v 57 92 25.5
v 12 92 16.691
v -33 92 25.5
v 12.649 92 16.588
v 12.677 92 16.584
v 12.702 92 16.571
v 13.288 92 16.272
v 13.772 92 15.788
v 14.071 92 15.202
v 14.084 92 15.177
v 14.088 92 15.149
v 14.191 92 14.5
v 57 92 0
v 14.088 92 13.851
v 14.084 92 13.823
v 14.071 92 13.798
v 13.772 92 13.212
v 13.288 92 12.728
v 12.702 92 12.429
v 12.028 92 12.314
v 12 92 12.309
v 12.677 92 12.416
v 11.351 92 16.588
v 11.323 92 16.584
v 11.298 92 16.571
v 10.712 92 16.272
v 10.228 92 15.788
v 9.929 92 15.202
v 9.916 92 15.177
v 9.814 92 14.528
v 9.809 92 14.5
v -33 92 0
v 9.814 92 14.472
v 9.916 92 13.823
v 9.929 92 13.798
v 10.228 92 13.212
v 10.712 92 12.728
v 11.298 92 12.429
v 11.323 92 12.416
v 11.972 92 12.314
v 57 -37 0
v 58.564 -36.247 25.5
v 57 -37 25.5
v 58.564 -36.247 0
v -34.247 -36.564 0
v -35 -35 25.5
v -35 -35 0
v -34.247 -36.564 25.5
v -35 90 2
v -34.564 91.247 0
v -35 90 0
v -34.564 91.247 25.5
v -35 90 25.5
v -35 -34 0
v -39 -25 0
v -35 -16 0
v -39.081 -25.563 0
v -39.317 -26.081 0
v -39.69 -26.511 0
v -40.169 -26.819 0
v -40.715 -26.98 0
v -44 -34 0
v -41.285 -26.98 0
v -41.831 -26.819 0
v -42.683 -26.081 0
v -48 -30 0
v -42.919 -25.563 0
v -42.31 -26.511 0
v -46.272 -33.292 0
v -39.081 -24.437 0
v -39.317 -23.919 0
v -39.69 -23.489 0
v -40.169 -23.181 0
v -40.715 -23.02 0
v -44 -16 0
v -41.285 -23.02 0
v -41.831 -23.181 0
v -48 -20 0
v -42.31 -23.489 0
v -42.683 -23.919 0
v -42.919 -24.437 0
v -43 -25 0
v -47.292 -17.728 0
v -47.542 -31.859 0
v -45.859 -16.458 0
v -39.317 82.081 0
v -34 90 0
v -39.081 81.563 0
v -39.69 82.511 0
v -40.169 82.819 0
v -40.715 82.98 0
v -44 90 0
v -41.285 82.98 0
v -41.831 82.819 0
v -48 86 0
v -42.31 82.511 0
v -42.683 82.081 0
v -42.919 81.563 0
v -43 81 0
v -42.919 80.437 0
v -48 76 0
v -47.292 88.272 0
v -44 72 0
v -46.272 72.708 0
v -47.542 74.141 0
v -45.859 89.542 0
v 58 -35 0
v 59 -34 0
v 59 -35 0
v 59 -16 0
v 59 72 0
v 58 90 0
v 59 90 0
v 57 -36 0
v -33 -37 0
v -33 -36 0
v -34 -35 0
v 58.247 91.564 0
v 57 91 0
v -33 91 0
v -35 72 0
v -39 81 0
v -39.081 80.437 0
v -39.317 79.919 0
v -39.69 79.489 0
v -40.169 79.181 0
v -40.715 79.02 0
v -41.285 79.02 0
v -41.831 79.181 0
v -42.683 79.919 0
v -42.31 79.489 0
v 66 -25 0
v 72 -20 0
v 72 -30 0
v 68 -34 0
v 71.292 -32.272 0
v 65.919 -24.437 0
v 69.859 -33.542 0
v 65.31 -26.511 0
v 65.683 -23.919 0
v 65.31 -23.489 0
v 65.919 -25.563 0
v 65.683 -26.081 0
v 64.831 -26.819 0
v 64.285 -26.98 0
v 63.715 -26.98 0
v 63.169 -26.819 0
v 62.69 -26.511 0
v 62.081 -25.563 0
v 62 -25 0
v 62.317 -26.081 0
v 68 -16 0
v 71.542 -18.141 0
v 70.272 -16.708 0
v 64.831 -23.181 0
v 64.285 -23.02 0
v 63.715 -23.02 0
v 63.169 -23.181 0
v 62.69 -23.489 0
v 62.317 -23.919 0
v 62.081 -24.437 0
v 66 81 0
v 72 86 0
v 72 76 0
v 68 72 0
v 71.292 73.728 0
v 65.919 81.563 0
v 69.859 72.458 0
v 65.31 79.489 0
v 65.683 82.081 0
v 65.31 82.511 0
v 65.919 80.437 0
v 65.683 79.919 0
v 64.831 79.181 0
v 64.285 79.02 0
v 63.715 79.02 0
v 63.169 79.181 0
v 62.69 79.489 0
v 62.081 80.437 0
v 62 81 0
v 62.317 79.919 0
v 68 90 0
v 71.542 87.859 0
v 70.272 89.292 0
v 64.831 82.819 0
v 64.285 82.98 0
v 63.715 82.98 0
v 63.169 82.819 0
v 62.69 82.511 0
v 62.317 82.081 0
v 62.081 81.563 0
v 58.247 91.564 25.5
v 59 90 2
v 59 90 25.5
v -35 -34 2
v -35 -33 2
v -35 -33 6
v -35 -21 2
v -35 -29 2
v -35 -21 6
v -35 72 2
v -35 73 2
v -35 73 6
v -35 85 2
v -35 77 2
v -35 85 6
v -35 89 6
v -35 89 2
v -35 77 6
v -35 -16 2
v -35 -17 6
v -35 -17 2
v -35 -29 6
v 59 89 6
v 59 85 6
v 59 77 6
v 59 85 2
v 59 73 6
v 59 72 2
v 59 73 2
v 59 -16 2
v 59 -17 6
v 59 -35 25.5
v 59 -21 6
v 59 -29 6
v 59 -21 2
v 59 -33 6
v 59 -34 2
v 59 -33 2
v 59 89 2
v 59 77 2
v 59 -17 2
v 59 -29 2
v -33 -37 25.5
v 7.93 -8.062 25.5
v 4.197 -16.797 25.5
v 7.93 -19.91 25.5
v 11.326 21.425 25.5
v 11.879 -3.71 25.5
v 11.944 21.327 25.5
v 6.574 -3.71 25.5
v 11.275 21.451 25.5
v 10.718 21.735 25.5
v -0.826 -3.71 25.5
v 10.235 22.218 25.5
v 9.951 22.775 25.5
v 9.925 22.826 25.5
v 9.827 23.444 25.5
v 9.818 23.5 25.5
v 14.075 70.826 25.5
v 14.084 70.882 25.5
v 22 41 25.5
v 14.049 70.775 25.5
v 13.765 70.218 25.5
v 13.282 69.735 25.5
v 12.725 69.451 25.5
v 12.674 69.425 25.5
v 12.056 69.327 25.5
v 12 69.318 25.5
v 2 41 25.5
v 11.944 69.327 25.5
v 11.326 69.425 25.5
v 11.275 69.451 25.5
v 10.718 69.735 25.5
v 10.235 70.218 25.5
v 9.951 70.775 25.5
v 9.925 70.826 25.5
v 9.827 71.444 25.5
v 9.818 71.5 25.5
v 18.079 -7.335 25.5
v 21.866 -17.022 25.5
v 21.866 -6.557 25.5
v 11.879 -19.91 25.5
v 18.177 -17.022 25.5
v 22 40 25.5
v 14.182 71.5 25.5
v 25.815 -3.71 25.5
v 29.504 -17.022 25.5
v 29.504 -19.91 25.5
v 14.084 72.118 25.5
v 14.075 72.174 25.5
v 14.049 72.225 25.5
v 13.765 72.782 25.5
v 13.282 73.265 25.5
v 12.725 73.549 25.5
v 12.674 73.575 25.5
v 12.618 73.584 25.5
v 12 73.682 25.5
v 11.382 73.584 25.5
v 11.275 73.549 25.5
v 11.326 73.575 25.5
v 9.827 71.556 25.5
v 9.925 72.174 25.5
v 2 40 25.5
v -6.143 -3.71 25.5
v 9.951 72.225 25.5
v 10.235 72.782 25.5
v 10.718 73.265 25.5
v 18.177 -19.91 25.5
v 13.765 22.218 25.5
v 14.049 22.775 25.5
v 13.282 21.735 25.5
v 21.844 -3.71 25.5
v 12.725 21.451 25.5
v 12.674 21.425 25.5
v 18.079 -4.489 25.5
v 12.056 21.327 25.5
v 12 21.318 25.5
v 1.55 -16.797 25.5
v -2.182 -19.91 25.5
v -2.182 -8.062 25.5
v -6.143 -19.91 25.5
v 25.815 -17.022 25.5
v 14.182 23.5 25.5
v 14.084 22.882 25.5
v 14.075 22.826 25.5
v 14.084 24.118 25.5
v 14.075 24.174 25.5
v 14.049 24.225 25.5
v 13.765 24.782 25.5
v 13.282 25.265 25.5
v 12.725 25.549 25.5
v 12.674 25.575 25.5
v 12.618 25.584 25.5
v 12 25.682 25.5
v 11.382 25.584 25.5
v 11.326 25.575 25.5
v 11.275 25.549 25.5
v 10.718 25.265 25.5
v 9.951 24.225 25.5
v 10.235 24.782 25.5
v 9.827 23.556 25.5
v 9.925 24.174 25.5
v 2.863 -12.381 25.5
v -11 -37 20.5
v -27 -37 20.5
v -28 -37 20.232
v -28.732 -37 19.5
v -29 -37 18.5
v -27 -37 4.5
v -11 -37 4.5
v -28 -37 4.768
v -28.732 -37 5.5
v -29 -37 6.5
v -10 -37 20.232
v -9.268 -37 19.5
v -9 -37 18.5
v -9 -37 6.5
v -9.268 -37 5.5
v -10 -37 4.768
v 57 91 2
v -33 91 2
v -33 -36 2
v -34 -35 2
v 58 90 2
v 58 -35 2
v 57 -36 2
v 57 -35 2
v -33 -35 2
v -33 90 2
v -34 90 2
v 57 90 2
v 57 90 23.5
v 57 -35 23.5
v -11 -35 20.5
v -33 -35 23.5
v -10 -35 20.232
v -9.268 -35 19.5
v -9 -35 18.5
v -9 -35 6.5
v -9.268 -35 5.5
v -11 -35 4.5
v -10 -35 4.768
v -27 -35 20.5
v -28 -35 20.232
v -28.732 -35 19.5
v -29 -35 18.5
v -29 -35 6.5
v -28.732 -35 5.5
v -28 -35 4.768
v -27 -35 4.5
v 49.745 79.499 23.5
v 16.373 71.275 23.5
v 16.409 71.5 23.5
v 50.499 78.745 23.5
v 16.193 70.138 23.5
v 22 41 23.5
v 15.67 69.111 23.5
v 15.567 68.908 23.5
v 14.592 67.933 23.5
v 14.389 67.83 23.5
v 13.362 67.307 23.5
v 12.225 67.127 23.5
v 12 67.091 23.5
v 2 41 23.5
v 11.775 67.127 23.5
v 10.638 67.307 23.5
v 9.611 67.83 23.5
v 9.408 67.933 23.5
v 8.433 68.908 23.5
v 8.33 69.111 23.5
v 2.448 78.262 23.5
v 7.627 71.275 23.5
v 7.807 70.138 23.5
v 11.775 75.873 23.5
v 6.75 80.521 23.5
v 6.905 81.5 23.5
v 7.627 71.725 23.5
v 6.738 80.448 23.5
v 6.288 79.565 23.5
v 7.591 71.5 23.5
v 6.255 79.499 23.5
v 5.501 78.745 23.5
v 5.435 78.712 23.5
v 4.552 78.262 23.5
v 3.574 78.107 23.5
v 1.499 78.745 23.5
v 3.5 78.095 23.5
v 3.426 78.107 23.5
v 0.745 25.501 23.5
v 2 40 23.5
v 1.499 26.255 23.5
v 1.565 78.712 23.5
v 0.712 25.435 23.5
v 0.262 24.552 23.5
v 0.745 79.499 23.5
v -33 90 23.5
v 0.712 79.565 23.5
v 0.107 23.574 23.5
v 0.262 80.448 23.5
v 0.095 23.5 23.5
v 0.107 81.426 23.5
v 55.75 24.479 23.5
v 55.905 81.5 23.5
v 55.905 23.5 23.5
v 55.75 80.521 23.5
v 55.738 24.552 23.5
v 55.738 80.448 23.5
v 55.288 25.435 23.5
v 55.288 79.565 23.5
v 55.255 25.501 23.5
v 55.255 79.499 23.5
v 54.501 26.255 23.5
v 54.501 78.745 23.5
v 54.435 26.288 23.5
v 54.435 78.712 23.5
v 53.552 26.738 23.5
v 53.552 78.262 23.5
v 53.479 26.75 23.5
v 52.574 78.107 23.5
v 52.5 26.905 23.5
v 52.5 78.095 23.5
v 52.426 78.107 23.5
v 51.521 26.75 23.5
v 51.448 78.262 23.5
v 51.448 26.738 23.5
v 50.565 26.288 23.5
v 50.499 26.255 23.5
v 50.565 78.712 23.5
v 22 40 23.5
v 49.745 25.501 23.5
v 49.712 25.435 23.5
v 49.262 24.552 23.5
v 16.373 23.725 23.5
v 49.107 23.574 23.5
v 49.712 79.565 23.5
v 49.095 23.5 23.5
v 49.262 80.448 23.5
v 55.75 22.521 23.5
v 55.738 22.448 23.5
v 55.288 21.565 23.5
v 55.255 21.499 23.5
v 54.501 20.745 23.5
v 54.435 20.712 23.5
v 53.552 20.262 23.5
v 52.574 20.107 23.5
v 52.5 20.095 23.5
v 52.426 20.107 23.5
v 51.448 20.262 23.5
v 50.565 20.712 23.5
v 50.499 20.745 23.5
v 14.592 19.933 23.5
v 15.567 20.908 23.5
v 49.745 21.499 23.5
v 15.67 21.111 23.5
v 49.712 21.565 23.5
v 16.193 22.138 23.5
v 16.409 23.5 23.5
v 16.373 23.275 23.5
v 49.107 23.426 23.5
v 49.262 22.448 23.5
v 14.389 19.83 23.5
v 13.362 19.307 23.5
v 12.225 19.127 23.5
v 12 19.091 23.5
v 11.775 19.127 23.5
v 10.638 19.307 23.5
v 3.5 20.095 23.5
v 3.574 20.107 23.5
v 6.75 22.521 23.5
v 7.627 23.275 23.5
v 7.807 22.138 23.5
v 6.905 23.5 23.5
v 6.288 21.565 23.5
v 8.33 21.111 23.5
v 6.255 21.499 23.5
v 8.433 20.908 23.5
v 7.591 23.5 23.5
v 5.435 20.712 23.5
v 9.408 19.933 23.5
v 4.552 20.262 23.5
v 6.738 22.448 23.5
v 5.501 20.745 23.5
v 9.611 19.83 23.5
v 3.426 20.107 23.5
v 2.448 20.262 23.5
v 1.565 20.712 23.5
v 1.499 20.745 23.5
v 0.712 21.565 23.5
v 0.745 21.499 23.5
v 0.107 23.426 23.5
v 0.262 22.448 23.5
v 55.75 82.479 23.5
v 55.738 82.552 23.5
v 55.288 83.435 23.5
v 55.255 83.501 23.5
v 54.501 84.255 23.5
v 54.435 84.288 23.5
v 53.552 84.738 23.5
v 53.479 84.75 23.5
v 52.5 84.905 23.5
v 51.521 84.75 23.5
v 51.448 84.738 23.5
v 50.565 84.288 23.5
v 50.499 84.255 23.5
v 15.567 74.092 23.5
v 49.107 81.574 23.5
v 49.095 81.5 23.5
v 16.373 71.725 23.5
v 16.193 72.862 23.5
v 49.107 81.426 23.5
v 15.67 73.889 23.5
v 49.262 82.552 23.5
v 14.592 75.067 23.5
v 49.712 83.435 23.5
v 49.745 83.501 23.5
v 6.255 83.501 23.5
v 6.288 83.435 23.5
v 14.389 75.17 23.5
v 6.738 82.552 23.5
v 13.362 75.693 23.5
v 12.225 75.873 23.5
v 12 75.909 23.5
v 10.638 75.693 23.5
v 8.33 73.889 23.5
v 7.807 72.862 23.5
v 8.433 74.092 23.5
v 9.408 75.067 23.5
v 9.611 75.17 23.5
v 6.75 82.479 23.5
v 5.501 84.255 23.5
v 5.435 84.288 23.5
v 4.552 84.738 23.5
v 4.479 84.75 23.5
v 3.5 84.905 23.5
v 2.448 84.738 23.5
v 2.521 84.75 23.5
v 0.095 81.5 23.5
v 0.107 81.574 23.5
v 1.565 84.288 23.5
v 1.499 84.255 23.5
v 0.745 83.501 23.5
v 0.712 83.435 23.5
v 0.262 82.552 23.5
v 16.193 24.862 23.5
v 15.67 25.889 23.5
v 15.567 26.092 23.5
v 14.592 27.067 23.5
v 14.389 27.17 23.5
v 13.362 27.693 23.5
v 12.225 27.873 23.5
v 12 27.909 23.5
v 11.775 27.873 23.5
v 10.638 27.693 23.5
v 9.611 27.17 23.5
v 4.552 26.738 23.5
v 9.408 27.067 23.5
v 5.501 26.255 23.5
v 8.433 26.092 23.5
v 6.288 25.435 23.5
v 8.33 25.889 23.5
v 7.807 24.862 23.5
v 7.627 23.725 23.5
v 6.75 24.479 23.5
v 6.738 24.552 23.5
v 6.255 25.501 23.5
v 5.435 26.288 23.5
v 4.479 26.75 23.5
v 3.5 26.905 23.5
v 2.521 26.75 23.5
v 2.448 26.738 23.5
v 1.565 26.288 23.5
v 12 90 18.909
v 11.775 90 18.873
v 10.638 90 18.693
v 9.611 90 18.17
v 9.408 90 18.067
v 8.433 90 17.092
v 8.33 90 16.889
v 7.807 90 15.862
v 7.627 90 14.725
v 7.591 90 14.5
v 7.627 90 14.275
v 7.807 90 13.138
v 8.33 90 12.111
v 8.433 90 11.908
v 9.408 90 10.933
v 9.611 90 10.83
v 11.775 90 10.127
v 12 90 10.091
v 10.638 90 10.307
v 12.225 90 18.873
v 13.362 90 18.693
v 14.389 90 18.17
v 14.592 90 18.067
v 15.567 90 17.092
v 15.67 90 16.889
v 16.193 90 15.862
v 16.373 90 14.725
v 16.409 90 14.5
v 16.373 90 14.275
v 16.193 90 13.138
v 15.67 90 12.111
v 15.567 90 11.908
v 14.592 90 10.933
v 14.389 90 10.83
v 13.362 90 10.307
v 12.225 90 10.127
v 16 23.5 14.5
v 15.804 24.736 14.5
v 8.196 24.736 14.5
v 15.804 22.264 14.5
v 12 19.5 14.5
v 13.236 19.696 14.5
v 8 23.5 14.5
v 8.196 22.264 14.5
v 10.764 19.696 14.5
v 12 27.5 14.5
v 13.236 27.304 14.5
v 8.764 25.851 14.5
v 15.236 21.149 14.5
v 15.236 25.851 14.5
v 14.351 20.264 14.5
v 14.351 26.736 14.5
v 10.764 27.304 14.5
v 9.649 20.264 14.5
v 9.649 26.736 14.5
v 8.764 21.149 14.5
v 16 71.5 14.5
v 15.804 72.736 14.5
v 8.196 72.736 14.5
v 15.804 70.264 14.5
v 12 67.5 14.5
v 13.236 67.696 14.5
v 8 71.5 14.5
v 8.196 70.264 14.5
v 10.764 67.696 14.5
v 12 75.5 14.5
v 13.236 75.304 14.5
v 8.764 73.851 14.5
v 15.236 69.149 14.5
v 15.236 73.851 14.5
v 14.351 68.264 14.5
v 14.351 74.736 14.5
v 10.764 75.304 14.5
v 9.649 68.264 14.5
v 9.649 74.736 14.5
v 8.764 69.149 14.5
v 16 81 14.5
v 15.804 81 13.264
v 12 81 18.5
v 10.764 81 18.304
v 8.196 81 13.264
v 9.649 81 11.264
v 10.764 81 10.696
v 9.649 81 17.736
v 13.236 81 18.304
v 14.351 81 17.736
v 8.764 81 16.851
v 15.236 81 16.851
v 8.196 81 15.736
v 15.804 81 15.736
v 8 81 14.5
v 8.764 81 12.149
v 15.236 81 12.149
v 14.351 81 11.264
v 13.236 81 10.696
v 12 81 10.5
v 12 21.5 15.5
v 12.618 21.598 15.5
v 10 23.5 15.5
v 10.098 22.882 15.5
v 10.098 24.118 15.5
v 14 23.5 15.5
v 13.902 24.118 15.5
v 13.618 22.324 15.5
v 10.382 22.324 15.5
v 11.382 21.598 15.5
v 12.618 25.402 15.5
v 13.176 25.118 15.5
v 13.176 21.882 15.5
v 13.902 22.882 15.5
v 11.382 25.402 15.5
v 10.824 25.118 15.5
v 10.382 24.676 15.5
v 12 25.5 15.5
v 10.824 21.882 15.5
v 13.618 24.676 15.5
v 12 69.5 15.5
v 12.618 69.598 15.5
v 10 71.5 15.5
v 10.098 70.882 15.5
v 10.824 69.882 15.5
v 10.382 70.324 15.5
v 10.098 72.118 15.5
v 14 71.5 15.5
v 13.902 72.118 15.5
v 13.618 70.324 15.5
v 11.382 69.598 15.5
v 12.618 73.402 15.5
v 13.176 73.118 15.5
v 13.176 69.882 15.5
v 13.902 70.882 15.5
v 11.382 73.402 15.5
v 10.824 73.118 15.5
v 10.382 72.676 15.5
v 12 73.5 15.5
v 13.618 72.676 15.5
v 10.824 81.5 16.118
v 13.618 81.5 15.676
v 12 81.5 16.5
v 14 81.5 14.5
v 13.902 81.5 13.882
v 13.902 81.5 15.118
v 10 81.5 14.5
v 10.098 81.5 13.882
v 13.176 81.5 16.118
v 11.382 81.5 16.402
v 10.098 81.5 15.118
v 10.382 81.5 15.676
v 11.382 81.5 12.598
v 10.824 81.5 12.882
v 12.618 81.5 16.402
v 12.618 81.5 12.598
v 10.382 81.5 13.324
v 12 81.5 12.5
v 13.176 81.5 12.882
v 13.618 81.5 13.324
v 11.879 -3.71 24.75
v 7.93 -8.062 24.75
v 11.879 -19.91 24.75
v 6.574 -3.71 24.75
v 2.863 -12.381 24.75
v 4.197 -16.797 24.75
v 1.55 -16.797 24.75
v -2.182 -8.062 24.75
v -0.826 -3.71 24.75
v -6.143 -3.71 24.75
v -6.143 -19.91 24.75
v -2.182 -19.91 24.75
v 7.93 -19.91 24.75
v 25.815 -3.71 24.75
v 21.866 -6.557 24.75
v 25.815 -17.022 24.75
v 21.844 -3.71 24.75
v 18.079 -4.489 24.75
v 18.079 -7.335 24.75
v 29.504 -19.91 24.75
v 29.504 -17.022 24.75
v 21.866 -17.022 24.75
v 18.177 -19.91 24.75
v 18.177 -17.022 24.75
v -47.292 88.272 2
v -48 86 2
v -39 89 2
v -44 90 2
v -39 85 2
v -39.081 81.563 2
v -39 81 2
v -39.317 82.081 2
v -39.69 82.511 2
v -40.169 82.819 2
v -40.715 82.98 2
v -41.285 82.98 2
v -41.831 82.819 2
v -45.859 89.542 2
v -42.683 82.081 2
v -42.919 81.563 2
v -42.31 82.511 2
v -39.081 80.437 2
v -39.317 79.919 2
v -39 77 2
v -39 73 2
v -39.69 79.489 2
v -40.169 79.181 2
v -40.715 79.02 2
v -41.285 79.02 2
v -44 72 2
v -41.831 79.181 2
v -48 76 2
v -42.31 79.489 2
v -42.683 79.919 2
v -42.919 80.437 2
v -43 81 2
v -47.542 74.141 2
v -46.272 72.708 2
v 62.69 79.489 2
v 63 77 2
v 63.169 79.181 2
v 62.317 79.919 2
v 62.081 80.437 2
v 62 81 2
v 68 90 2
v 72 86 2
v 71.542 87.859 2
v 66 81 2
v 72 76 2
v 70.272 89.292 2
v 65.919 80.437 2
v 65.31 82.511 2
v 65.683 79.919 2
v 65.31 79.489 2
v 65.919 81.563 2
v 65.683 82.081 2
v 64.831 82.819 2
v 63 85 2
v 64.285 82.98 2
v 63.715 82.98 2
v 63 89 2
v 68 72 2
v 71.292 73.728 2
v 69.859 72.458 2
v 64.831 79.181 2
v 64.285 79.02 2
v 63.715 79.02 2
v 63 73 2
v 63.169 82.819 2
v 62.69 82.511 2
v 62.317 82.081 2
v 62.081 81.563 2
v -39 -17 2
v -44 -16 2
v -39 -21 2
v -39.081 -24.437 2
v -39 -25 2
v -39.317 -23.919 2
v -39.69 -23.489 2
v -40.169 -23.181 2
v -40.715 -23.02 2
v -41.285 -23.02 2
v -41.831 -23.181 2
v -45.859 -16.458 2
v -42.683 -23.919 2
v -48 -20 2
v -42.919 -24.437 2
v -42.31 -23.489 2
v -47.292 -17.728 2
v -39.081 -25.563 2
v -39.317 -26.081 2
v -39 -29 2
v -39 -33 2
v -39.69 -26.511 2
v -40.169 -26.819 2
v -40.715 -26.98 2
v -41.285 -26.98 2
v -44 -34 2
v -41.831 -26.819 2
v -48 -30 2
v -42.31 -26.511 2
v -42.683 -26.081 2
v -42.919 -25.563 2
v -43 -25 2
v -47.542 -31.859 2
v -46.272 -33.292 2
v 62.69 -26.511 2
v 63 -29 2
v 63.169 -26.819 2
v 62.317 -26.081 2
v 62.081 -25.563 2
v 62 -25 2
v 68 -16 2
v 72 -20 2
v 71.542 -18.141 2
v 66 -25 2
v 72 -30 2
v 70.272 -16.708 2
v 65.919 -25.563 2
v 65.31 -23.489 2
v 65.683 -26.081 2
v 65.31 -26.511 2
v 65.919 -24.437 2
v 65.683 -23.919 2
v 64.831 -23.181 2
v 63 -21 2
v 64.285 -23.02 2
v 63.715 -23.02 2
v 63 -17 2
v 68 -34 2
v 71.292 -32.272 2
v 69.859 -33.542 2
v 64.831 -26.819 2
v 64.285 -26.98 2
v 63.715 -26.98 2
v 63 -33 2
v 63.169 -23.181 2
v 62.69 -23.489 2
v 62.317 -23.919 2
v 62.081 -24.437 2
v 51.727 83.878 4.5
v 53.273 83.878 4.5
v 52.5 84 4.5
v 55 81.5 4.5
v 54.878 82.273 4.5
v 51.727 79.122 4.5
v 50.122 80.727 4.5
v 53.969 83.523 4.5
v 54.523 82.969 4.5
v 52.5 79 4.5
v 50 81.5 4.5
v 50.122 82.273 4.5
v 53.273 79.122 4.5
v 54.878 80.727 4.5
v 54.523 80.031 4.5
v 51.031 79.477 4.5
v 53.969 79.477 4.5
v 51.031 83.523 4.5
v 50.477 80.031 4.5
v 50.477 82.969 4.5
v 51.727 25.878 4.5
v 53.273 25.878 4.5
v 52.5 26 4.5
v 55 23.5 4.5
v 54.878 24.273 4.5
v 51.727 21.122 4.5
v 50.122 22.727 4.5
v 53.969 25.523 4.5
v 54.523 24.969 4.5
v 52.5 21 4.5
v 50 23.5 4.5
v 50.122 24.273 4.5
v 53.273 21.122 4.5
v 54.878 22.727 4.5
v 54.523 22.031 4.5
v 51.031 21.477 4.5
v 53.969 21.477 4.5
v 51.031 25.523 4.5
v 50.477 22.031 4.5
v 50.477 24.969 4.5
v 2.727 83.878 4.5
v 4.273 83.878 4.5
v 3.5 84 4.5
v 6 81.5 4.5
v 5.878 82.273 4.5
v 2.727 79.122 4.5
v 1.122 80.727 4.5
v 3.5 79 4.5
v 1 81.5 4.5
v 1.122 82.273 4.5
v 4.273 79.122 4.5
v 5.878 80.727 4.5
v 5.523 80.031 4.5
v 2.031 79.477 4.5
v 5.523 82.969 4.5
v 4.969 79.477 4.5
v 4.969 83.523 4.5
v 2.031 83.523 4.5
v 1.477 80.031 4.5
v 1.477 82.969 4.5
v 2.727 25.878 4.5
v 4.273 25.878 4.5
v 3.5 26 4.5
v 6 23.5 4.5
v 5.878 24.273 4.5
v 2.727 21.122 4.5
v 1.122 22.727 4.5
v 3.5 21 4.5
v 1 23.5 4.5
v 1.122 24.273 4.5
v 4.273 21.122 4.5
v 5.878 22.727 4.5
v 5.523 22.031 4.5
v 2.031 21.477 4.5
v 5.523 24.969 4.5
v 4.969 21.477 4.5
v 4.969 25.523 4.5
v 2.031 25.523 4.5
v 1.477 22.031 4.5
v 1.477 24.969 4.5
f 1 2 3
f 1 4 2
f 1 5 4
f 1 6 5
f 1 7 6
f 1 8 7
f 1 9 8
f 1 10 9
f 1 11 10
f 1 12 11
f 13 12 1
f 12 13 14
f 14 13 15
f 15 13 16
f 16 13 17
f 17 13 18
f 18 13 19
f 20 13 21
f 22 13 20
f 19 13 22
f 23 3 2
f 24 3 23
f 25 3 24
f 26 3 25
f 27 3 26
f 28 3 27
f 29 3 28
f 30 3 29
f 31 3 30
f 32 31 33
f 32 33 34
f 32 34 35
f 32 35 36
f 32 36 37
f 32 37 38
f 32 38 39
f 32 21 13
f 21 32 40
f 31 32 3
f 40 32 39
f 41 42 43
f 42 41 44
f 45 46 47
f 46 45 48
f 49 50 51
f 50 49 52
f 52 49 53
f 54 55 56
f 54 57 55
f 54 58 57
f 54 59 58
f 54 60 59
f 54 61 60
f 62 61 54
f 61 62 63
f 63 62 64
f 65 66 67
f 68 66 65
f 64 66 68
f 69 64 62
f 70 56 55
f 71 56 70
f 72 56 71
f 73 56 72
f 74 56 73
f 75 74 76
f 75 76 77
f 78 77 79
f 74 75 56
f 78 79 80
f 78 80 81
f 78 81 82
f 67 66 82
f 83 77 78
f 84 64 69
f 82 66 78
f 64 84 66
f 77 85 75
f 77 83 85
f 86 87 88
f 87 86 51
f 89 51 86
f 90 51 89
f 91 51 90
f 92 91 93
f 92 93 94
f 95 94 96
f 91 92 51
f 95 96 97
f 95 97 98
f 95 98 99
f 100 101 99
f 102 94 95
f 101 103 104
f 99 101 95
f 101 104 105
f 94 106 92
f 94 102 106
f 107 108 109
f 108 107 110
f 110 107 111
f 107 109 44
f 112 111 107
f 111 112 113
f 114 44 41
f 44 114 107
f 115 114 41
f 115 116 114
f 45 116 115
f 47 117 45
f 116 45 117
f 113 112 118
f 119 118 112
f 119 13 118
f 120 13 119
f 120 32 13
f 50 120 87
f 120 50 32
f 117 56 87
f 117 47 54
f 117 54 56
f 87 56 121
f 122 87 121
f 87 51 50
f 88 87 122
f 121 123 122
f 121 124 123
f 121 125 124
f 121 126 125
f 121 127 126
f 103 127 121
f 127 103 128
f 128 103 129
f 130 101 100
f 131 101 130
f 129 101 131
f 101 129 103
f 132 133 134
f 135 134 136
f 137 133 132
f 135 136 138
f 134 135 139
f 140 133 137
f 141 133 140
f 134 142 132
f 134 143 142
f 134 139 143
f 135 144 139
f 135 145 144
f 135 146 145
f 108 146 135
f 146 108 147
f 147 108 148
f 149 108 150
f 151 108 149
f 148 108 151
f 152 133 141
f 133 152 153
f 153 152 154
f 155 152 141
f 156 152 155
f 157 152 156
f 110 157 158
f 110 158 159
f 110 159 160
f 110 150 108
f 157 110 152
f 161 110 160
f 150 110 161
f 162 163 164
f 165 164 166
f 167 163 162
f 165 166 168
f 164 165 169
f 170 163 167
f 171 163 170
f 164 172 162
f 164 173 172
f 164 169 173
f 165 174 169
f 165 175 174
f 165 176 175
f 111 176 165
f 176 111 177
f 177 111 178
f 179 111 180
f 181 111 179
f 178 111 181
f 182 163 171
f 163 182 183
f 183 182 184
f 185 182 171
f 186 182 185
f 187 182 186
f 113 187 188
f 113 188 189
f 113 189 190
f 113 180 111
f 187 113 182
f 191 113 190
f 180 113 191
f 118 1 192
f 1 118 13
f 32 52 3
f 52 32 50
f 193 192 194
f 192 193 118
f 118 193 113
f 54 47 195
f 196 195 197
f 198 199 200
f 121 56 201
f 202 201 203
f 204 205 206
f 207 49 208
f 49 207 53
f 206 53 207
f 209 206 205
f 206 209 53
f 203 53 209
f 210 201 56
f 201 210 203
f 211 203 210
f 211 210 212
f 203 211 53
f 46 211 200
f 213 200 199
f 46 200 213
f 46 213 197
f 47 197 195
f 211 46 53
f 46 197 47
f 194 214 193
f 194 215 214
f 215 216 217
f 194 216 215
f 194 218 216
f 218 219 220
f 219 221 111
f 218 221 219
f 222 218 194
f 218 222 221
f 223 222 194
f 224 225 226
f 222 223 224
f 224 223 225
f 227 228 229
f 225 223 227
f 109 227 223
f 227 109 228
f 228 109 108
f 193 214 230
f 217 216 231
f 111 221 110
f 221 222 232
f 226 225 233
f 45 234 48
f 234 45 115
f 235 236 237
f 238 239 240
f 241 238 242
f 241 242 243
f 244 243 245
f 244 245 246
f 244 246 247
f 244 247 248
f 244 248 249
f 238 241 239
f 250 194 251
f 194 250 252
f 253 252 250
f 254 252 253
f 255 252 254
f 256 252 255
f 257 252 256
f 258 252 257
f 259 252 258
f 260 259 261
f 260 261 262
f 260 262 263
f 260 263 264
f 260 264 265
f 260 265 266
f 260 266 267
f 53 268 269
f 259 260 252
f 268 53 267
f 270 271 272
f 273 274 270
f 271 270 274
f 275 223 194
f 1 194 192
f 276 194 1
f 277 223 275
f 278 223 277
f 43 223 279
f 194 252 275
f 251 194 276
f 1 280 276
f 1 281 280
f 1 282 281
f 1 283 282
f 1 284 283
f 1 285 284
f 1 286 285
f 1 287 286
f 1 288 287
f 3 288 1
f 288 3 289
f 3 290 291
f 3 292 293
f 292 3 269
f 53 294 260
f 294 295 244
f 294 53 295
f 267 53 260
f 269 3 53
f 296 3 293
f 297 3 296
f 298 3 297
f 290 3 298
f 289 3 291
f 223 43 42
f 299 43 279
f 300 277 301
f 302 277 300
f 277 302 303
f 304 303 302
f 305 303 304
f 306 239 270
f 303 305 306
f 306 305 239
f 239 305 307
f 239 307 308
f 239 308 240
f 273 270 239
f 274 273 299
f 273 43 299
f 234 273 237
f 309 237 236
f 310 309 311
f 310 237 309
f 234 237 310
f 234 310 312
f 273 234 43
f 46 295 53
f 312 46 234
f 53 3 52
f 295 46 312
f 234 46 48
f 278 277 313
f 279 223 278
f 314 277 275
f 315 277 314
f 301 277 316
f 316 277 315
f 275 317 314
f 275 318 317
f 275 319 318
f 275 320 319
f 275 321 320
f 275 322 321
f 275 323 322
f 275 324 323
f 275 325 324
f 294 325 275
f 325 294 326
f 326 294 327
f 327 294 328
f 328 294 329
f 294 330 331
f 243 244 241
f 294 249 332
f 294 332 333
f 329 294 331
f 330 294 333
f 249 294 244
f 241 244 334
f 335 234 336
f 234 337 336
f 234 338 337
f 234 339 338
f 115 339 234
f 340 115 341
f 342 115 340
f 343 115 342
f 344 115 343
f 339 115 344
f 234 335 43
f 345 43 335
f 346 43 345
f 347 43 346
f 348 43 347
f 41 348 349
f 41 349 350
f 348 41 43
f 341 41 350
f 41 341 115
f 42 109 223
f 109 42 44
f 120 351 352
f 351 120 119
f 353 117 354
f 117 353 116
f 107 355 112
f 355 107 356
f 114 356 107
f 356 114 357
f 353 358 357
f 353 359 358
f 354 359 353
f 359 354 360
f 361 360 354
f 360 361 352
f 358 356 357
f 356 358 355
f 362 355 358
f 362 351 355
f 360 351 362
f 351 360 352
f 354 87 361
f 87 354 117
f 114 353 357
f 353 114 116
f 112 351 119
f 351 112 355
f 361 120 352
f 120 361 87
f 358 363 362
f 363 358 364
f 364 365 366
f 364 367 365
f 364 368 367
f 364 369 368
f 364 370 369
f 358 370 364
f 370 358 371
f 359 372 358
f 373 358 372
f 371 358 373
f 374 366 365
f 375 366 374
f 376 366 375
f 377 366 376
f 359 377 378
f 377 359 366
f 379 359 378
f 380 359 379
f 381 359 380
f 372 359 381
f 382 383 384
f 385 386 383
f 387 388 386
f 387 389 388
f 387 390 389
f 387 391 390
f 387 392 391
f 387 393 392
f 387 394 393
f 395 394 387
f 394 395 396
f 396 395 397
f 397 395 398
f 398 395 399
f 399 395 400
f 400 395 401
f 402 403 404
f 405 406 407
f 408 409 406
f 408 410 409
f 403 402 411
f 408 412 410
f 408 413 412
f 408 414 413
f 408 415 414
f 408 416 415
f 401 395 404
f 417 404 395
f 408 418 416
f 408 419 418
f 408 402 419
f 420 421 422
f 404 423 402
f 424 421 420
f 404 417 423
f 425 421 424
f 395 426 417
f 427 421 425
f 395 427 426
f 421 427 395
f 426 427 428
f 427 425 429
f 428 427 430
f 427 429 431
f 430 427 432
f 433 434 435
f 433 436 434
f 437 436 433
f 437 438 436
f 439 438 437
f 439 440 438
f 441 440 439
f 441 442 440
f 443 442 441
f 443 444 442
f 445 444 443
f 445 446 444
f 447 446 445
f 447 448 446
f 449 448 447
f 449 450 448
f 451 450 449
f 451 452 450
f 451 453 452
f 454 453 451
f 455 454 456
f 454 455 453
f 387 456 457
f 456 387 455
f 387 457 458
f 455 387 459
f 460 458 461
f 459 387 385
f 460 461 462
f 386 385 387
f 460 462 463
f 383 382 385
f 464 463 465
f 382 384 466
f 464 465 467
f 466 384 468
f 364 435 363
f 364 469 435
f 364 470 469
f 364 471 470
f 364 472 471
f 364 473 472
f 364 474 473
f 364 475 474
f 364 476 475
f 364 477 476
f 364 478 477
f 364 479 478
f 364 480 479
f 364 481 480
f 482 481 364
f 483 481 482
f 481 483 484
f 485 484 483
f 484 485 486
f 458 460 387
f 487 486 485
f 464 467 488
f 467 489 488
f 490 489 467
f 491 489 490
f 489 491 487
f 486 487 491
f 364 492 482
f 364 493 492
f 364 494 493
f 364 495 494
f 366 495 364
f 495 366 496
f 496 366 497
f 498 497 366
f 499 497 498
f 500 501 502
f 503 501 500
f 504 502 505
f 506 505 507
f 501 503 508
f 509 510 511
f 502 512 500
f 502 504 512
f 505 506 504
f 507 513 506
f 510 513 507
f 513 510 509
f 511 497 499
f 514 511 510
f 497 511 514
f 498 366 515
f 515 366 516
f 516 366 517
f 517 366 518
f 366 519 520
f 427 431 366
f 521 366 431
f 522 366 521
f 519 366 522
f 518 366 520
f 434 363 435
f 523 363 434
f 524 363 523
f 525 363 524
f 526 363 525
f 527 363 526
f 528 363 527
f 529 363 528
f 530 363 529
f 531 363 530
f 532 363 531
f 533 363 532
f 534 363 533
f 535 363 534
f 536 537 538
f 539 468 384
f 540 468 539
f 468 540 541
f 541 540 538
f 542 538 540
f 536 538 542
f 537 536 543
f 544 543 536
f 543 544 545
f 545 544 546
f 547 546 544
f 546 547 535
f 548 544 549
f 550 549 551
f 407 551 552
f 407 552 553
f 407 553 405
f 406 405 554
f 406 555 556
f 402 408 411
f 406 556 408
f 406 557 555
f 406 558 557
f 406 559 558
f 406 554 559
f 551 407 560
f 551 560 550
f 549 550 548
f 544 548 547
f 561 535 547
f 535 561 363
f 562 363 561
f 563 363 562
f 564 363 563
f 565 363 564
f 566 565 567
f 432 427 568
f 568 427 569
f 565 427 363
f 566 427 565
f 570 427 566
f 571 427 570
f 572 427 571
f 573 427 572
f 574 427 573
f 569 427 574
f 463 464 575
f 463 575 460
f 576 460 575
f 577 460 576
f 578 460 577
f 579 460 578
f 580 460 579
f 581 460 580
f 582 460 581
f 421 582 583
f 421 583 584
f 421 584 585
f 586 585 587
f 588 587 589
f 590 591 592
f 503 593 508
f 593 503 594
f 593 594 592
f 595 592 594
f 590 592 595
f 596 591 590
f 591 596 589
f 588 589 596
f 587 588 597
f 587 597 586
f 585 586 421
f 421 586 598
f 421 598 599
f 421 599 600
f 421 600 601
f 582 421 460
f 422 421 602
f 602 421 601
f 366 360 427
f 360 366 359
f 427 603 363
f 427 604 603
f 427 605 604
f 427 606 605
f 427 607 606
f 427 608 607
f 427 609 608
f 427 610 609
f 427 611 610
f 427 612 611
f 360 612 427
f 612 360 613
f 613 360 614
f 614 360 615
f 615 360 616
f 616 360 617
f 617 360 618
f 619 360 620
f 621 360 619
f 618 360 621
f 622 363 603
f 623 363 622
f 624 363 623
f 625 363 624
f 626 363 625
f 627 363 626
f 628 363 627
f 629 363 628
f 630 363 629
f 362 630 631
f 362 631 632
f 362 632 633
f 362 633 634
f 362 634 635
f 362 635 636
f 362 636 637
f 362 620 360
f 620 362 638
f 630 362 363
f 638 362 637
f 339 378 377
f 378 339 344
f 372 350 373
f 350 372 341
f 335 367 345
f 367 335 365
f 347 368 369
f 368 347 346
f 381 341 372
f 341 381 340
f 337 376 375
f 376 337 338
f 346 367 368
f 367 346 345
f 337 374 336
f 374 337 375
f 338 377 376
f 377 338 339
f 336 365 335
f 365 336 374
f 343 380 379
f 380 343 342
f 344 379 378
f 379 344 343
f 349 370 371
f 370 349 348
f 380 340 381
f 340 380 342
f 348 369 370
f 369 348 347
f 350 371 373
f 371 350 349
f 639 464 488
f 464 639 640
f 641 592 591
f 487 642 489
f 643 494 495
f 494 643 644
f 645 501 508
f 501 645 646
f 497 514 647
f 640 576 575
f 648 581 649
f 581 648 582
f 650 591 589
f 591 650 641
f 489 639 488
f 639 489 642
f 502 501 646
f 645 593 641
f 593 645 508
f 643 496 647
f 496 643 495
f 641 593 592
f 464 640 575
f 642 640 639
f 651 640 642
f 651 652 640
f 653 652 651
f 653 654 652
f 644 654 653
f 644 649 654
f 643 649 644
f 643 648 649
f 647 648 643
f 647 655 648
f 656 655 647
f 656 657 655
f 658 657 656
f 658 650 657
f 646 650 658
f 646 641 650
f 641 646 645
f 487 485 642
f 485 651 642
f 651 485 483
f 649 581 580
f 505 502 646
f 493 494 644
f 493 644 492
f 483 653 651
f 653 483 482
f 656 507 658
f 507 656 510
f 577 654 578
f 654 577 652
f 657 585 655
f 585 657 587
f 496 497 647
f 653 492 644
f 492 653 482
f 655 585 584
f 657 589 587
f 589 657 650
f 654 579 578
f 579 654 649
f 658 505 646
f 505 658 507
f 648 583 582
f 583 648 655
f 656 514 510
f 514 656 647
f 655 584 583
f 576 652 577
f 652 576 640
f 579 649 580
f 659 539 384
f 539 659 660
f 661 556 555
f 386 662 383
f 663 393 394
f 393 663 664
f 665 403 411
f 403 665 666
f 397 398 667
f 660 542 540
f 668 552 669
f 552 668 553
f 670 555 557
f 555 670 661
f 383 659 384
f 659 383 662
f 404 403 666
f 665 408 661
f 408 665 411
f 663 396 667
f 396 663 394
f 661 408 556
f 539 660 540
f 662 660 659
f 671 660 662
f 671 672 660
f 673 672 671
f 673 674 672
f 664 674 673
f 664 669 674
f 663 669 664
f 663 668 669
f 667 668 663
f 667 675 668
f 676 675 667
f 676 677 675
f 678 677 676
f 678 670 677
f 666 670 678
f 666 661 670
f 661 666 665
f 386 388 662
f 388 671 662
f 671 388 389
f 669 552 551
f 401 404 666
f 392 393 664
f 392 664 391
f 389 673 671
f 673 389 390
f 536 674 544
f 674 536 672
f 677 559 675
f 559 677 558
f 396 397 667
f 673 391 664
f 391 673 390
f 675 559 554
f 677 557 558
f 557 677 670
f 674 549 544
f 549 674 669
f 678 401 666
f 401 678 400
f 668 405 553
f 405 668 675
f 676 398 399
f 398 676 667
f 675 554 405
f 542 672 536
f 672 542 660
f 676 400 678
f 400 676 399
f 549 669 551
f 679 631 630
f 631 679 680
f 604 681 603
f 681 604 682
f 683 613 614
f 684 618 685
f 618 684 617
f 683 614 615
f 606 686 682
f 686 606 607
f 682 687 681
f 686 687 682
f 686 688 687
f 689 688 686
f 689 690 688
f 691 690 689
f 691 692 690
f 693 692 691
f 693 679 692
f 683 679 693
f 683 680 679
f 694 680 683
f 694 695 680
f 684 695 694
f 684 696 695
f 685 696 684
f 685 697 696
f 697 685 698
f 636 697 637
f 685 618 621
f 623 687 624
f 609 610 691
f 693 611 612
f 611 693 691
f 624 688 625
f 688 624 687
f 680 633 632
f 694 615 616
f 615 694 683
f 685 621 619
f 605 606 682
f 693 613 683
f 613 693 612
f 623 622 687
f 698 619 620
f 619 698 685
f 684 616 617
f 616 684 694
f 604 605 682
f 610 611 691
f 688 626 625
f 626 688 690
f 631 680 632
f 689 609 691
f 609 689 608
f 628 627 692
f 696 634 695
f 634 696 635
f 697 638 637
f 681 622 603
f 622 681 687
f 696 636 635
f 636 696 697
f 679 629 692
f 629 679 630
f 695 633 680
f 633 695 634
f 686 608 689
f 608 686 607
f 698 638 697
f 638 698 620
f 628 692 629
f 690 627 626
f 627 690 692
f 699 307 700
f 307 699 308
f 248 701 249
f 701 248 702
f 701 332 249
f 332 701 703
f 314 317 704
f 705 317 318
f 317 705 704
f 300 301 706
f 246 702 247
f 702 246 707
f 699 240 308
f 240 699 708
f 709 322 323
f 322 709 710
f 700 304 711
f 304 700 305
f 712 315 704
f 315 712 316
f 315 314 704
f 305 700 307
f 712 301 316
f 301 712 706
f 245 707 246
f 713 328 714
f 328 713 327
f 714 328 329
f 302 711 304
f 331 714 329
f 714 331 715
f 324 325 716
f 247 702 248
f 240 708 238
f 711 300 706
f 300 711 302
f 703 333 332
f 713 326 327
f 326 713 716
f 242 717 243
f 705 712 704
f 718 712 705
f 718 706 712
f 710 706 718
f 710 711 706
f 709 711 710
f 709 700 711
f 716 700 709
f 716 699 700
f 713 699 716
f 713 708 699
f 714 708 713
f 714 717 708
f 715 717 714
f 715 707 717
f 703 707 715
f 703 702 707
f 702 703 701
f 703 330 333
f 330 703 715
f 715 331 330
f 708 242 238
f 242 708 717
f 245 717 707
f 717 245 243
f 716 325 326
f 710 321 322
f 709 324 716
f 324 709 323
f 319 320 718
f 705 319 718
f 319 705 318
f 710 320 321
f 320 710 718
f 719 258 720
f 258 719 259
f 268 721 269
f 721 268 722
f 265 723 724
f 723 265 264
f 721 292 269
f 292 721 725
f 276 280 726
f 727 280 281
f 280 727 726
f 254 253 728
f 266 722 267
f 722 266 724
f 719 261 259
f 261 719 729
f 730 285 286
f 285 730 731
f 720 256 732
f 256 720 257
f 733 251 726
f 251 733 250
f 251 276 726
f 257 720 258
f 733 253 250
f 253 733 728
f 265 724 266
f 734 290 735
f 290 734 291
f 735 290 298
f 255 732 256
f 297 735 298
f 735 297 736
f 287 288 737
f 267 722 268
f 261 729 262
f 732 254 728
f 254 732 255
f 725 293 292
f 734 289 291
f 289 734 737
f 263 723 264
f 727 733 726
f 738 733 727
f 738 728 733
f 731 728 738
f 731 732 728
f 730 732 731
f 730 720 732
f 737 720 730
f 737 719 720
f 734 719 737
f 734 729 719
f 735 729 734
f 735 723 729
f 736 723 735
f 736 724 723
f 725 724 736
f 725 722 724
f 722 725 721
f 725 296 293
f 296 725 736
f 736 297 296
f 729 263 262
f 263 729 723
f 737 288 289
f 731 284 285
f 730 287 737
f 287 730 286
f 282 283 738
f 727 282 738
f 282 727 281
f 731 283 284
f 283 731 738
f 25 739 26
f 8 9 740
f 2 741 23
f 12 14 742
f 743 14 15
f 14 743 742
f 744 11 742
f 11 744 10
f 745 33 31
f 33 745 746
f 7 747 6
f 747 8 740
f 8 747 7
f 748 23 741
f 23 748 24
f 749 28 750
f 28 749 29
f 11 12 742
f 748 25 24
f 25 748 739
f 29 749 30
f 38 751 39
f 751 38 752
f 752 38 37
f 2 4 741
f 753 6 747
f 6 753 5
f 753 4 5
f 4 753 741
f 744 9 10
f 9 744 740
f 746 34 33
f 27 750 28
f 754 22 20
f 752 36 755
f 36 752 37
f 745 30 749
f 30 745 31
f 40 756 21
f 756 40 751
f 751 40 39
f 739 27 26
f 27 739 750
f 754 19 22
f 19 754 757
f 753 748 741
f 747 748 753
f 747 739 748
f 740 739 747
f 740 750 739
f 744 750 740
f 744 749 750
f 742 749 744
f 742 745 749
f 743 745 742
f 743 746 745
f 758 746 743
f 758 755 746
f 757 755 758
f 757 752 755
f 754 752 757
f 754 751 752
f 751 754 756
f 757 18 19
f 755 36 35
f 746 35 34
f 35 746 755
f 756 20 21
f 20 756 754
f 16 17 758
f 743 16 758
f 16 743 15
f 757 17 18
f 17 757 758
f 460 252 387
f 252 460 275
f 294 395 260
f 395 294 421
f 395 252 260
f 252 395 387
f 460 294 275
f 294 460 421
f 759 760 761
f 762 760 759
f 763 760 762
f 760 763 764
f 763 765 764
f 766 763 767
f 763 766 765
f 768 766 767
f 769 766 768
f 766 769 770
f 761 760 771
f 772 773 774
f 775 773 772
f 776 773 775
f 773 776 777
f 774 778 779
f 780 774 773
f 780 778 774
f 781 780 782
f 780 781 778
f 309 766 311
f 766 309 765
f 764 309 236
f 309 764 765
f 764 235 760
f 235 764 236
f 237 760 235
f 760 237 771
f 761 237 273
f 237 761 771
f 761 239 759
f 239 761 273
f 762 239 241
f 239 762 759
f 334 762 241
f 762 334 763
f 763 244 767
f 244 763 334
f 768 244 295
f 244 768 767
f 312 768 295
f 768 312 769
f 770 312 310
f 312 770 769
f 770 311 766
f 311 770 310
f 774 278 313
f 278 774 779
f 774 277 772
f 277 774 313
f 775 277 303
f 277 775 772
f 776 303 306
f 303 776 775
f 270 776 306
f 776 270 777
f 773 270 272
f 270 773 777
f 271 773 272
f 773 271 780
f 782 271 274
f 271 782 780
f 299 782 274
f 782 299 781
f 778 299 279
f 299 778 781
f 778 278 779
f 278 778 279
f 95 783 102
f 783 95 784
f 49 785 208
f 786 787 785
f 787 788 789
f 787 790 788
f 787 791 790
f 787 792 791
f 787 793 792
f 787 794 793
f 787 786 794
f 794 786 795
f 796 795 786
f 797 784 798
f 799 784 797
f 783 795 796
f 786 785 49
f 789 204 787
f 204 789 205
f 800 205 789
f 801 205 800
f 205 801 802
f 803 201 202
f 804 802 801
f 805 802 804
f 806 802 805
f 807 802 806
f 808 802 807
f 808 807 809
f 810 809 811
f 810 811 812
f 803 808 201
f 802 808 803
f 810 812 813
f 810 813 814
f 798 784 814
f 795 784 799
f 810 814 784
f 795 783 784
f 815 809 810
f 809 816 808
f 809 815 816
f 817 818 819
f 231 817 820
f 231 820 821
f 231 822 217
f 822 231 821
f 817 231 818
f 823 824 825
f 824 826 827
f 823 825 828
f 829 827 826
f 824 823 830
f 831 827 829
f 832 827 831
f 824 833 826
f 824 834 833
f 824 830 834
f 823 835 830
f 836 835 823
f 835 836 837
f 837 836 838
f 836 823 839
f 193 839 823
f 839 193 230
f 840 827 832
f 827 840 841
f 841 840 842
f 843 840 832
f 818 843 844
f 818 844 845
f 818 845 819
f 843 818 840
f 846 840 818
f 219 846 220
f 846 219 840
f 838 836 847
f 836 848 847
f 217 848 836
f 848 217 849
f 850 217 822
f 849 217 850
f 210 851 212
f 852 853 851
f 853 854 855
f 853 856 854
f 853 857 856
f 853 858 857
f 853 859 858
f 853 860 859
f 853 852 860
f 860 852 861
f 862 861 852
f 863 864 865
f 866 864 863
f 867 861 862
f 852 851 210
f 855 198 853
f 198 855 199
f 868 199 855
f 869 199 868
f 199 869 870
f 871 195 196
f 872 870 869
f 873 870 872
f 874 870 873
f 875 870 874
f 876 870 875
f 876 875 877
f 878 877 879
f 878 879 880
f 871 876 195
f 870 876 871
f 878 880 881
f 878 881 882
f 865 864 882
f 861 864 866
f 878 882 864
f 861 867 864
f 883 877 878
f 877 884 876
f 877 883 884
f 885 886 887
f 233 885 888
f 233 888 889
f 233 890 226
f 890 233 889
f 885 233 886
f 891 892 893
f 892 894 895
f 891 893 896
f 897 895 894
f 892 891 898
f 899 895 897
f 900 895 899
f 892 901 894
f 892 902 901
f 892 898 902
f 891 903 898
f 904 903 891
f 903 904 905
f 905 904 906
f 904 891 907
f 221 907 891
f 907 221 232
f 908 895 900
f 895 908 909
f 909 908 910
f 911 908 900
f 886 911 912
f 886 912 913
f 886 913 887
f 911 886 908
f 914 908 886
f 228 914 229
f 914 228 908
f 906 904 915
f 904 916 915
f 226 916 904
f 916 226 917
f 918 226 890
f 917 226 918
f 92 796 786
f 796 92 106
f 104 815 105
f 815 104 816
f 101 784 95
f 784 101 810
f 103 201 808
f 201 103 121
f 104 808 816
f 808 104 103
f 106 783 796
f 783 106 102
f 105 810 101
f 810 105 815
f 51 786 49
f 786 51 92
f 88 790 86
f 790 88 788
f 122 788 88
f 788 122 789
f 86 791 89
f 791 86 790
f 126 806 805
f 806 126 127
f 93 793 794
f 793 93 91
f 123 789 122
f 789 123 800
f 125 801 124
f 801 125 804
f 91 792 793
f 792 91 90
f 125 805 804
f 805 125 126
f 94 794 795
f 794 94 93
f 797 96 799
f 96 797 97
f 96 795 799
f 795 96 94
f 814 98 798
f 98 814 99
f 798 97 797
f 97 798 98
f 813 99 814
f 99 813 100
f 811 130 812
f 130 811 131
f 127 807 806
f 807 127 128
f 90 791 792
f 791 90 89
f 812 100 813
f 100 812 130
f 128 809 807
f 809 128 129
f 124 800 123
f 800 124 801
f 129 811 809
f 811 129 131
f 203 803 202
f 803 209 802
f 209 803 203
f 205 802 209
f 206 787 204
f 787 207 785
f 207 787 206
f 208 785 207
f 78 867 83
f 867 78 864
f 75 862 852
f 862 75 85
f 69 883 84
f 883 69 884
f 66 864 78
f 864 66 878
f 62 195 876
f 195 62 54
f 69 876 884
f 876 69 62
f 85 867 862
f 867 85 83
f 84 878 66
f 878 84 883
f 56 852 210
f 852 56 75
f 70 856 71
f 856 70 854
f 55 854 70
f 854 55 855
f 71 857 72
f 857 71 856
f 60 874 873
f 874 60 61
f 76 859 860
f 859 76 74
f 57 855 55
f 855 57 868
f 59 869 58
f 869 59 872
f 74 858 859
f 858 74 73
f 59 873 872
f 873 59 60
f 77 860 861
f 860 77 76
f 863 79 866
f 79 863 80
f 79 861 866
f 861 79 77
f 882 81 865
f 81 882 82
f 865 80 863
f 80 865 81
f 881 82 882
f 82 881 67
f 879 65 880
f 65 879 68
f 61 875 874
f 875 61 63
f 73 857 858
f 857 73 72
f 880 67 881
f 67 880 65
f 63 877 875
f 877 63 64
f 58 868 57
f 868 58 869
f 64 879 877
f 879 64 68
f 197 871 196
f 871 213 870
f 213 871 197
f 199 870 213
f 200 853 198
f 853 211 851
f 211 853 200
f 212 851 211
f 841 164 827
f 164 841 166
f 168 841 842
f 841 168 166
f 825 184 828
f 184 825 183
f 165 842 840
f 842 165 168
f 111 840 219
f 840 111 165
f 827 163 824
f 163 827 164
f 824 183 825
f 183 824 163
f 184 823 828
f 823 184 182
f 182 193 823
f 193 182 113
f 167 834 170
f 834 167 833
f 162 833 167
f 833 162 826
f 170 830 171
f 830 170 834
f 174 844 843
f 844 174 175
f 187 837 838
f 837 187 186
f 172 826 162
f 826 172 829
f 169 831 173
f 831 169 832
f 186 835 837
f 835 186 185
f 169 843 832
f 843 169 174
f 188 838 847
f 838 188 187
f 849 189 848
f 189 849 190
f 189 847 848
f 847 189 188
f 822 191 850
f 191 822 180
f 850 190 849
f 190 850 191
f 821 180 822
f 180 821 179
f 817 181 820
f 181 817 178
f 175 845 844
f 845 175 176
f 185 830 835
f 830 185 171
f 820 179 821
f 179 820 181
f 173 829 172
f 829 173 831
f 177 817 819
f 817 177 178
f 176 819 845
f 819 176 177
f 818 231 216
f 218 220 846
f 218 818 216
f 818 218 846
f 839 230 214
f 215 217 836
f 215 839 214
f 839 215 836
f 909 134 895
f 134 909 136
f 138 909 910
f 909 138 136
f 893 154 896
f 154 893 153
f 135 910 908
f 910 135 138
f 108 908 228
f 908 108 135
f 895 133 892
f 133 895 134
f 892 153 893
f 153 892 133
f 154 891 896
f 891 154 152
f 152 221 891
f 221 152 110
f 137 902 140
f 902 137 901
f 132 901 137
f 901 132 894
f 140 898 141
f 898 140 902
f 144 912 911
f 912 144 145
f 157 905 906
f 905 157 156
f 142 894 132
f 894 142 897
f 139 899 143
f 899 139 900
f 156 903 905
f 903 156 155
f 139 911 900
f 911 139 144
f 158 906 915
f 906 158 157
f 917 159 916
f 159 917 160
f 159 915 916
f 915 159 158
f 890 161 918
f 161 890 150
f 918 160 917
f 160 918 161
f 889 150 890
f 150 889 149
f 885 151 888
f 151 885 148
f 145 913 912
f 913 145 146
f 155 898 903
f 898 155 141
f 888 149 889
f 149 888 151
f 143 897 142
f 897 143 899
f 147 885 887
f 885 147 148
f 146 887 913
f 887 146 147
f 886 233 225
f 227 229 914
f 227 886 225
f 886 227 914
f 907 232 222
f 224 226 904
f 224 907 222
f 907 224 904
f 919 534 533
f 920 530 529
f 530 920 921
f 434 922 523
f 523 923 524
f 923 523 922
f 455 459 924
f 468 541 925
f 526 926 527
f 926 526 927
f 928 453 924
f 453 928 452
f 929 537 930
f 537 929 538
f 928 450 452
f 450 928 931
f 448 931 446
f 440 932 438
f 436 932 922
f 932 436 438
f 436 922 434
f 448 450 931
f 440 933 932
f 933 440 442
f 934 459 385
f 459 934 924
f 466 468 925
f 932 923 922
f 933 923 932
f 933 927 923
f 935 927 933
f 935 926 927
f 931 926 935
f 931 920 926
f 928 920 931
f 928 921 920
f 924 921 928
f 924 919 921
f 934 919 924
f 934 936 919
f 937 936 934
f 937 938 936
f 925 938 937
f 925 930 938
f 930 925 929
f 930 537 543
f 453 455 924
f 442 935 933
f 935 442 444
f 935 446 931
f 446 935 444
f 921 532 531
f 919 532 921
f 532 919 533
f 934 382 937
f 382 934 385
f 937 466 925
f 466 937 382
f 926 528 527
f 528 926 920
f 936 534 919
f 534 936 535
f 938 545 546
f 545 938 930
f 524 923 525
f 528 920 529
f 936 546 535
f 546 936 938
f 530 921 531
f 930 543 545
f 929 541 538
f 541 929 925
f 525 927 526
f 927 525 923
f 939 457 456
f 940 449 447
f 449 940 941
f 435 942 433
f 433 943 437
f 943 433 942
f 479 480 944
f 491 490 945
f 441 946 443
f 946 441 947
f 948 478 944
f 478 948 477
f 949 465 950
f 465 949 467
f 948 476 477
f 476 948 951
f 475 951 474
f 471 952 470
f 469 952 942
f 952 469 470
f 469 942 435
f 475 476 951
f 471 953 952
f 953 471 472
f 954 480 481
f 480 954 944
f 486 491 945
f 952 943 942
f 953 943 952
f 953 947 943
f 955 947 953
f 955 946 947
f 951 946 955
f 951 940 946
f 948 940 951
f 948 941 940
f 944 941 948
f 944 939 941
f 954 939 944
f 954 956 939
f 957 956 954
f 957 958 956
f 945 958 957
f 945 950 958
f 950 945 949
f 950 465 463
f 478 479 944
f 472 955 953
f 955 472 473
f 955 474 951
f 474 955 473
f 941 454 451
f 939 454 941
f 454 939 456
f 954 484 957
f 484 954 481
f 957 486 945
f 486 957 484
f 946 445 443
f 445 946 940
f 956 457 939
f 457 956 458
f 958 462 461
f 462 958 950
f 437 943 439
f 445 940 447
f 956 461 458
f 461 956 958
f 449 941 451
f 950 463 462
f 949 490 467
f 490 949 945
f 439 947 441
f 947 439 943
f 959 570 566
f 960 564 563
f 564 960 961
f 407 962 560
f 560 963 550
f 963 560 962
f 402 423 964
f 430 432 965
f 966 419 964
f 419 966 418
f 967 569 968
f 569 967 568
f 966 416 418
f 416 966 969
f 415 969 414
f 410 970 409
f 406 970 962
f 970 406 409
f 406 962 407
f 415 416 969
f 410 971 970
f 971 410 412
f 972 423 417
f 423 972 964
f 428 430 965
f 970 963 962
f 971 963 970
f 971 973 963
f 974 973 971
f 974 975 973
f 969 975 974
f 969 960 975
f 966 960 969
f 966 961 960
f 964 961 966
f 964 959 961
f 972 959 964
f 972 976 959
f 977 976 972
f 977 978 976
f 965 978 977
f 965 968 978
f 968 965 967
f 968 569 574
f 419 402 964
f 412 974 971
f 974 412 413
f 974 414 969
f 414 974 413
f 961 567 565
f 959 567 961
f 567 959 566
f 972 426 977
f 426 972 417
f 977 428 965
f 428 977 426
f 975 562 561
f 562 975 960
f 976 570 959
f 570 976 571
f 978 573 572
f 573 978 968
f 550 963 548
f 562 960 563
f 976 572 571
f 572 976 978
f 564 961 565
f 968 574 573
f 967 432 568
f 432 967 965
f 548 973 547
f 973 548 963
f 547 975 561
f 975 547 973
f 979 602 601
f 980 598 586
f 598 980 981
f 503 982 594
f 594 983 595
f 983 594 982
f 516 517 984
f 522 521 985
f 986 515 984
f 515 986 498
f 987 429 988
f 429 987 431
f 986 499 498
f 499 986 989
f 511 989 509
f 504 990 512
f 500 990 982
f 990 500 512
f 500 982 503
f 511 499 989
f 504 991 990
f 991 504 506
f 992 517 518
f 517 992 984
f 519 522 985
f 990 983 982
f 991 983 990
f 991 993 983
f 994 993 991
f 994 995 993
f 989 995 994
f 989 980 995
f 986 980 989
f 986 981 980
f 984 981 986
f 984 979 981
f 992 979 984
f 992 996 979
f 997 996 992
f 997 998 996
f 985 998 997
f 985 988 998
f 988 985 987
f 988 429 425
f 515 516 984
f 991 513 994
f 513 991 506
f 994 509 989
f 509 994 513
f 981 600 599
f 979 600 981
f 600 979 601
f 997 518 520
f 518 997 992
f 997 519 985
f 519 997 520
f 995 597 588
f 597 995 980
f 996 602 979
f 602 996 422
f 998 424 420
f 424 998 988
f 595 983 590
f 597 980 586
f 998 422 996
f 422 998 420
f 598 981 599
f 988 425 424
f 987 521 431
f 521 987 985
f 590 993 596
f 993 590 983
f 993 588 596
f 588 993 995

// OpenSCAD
// Mbox1b.scad
// This is the lid
difference(){
union(){
// main tub
translate([-33,-35,0]){
difference(){    

    linear_extrude(height=25.5)
    offset(r=2)
    square([90,125]);
        
    translate([0,0,-0.1])    
    linear_extrude(height=2.1)
    offset(r=1)
    square([90,125]);    

    translate([0,0,0])    
    linear_extrude(height=23.5)
    offset(r=0)
    square([90,125]);    
    
    // cutout for PoE cable in
    color("orange")
    translate([6,0.5,6.5]) 
    rotate([90,0,0])
    linear_extrude(height=4)
    offset(r=2,$fn=12)
    square([16,12]);
   
 }
}   // end of translate for base    


// socket bosses for the camera pole
translate([12,23.5,14.5]){
    cylinder(r1=4,r2=4.5,h=11,$fn=20);
}    
translate([12,71.5,14.5]){
    cylinder(r1=4,r2=4.5,h=11,$fn=20);
}    
translate([12,81,14.5]){
    rotate([-90,0,0])
    cylinder(r1=4,r2=4.5,h=11,$fn=20);
}    

}  // end of union


// cut socket holes for the camera pole
translate([12,23.5,15.5]){
    cylinder(r1=2,r2=2.2,h=11,$fn=20);
}    
translate([12,71.5,15.5]){
    cylinder(r1=2,r2=2.2,h=11,$fn=20);
}    
translate([12,81.5,14.5]){
    rotate([-90,0,0])
    cylinder(r1=2,r2=2.2,h=11,$fn=20);
}    

// cut ribbon cable pass-thru
translate([2,40,23])
    cube([20,1,6]);

// add text
translate ([12,-12,24.75]) color("red") 
    linear_extrude(height=1.5){
    text("M1", font = "Open Sans:style=Bold", size=16,halign="center",valign="center",spacing=1.1);
    }
      
}   // end of difference
    
// posts for the pi
translate([52.5,81.5,4.5]){
    cylinder(r1=2.5,r2=3.5,h=21,$fn=20);
}    
translate([52.5,23.5,4.5]){
    cylinder(r1=2.5,r2=3.5,h=21,$fn=20);
}    
translate([3.5,81.5,4.5]){
    cylinder(r1=2.5,r2=3.5,h=21,$fn=20);
}    
translate([3.5,23.5,4.5]){
    cylinder(r1=2.5,r2=3.5,h=21,$fn=20);
}    


px1=[ [0,0], [4,0], [0,4] ];
    




// mounting ears
difference(){
color("green")
union(){
translate([-44,76,0])    {
    difference(){
        linear_extrude(height=2)
        offset(r=4)
        square([10,10]);    
        
        translate([3,5,-1])
        cylinder(r=2,h=4,$fn=22);
    }    
    translate([9,-3,2])
    rotate([90,0,180])
    linear_extrude(height=4)
    polygon(points=px1);
    translate([9,9,2])
    rotate([90,0,180])
    linear_extrude(height=4)
    polygon(points=px1);
}
translate([-44,-30,0])    {
    difference(){
        linear_extrude(height=2)
        offset(r=4)
        square([10,10]);    
        
        translate([3,5,-1])
        cylinder(r=2,h=4,$fn=22);
    }
    translate([9,-3,2])
    rotate([90,0,180])
    linear_extrude(height=4)
    polygon(points=px1);
    translate([9,9,2])
    rotate([90,0,180])
    linear_extrude(height=4)
    polygon(points=px1);
}
translate([58,76,0])    {
    difference(){
        linear_extrude(height=2)
        offset(r=4)
        square([10,10]);    
        
        translate([6,5,-1])
        cylinder(r=2,h=4,$fn=22);
    }
    translate([1,1,2])
    rotate([90,0,0])
    linear_extrude(height=4)
    polygon(points=px1);
    translate([1,13,2])
    rotate([90,0,0])
    linear_extrude(height=4)
    polygon(points=px1);
}
translate([58,-30,0])    {
    difference(){
        linear_extrude(height=2)
        offset(r=4)
        square([10,10]);    
        
        translate([6,5,-1])
        cylinder(r=2,h=4,$fn=22);
    }
    translate([1,1,2])
    rotate([90,0,0])
    linear_extrude(height=4)
    polygon(points=px1);
    translate([1,13,2])
    rotate([90,0,0])
    linear_extrude(height=4)
    polygon(points=px1);
}
}

    translate([-33,-35,-0.1])
    linear_extrude(height=2.1)
    offset(r=1)
    square([90,125]);    
}
